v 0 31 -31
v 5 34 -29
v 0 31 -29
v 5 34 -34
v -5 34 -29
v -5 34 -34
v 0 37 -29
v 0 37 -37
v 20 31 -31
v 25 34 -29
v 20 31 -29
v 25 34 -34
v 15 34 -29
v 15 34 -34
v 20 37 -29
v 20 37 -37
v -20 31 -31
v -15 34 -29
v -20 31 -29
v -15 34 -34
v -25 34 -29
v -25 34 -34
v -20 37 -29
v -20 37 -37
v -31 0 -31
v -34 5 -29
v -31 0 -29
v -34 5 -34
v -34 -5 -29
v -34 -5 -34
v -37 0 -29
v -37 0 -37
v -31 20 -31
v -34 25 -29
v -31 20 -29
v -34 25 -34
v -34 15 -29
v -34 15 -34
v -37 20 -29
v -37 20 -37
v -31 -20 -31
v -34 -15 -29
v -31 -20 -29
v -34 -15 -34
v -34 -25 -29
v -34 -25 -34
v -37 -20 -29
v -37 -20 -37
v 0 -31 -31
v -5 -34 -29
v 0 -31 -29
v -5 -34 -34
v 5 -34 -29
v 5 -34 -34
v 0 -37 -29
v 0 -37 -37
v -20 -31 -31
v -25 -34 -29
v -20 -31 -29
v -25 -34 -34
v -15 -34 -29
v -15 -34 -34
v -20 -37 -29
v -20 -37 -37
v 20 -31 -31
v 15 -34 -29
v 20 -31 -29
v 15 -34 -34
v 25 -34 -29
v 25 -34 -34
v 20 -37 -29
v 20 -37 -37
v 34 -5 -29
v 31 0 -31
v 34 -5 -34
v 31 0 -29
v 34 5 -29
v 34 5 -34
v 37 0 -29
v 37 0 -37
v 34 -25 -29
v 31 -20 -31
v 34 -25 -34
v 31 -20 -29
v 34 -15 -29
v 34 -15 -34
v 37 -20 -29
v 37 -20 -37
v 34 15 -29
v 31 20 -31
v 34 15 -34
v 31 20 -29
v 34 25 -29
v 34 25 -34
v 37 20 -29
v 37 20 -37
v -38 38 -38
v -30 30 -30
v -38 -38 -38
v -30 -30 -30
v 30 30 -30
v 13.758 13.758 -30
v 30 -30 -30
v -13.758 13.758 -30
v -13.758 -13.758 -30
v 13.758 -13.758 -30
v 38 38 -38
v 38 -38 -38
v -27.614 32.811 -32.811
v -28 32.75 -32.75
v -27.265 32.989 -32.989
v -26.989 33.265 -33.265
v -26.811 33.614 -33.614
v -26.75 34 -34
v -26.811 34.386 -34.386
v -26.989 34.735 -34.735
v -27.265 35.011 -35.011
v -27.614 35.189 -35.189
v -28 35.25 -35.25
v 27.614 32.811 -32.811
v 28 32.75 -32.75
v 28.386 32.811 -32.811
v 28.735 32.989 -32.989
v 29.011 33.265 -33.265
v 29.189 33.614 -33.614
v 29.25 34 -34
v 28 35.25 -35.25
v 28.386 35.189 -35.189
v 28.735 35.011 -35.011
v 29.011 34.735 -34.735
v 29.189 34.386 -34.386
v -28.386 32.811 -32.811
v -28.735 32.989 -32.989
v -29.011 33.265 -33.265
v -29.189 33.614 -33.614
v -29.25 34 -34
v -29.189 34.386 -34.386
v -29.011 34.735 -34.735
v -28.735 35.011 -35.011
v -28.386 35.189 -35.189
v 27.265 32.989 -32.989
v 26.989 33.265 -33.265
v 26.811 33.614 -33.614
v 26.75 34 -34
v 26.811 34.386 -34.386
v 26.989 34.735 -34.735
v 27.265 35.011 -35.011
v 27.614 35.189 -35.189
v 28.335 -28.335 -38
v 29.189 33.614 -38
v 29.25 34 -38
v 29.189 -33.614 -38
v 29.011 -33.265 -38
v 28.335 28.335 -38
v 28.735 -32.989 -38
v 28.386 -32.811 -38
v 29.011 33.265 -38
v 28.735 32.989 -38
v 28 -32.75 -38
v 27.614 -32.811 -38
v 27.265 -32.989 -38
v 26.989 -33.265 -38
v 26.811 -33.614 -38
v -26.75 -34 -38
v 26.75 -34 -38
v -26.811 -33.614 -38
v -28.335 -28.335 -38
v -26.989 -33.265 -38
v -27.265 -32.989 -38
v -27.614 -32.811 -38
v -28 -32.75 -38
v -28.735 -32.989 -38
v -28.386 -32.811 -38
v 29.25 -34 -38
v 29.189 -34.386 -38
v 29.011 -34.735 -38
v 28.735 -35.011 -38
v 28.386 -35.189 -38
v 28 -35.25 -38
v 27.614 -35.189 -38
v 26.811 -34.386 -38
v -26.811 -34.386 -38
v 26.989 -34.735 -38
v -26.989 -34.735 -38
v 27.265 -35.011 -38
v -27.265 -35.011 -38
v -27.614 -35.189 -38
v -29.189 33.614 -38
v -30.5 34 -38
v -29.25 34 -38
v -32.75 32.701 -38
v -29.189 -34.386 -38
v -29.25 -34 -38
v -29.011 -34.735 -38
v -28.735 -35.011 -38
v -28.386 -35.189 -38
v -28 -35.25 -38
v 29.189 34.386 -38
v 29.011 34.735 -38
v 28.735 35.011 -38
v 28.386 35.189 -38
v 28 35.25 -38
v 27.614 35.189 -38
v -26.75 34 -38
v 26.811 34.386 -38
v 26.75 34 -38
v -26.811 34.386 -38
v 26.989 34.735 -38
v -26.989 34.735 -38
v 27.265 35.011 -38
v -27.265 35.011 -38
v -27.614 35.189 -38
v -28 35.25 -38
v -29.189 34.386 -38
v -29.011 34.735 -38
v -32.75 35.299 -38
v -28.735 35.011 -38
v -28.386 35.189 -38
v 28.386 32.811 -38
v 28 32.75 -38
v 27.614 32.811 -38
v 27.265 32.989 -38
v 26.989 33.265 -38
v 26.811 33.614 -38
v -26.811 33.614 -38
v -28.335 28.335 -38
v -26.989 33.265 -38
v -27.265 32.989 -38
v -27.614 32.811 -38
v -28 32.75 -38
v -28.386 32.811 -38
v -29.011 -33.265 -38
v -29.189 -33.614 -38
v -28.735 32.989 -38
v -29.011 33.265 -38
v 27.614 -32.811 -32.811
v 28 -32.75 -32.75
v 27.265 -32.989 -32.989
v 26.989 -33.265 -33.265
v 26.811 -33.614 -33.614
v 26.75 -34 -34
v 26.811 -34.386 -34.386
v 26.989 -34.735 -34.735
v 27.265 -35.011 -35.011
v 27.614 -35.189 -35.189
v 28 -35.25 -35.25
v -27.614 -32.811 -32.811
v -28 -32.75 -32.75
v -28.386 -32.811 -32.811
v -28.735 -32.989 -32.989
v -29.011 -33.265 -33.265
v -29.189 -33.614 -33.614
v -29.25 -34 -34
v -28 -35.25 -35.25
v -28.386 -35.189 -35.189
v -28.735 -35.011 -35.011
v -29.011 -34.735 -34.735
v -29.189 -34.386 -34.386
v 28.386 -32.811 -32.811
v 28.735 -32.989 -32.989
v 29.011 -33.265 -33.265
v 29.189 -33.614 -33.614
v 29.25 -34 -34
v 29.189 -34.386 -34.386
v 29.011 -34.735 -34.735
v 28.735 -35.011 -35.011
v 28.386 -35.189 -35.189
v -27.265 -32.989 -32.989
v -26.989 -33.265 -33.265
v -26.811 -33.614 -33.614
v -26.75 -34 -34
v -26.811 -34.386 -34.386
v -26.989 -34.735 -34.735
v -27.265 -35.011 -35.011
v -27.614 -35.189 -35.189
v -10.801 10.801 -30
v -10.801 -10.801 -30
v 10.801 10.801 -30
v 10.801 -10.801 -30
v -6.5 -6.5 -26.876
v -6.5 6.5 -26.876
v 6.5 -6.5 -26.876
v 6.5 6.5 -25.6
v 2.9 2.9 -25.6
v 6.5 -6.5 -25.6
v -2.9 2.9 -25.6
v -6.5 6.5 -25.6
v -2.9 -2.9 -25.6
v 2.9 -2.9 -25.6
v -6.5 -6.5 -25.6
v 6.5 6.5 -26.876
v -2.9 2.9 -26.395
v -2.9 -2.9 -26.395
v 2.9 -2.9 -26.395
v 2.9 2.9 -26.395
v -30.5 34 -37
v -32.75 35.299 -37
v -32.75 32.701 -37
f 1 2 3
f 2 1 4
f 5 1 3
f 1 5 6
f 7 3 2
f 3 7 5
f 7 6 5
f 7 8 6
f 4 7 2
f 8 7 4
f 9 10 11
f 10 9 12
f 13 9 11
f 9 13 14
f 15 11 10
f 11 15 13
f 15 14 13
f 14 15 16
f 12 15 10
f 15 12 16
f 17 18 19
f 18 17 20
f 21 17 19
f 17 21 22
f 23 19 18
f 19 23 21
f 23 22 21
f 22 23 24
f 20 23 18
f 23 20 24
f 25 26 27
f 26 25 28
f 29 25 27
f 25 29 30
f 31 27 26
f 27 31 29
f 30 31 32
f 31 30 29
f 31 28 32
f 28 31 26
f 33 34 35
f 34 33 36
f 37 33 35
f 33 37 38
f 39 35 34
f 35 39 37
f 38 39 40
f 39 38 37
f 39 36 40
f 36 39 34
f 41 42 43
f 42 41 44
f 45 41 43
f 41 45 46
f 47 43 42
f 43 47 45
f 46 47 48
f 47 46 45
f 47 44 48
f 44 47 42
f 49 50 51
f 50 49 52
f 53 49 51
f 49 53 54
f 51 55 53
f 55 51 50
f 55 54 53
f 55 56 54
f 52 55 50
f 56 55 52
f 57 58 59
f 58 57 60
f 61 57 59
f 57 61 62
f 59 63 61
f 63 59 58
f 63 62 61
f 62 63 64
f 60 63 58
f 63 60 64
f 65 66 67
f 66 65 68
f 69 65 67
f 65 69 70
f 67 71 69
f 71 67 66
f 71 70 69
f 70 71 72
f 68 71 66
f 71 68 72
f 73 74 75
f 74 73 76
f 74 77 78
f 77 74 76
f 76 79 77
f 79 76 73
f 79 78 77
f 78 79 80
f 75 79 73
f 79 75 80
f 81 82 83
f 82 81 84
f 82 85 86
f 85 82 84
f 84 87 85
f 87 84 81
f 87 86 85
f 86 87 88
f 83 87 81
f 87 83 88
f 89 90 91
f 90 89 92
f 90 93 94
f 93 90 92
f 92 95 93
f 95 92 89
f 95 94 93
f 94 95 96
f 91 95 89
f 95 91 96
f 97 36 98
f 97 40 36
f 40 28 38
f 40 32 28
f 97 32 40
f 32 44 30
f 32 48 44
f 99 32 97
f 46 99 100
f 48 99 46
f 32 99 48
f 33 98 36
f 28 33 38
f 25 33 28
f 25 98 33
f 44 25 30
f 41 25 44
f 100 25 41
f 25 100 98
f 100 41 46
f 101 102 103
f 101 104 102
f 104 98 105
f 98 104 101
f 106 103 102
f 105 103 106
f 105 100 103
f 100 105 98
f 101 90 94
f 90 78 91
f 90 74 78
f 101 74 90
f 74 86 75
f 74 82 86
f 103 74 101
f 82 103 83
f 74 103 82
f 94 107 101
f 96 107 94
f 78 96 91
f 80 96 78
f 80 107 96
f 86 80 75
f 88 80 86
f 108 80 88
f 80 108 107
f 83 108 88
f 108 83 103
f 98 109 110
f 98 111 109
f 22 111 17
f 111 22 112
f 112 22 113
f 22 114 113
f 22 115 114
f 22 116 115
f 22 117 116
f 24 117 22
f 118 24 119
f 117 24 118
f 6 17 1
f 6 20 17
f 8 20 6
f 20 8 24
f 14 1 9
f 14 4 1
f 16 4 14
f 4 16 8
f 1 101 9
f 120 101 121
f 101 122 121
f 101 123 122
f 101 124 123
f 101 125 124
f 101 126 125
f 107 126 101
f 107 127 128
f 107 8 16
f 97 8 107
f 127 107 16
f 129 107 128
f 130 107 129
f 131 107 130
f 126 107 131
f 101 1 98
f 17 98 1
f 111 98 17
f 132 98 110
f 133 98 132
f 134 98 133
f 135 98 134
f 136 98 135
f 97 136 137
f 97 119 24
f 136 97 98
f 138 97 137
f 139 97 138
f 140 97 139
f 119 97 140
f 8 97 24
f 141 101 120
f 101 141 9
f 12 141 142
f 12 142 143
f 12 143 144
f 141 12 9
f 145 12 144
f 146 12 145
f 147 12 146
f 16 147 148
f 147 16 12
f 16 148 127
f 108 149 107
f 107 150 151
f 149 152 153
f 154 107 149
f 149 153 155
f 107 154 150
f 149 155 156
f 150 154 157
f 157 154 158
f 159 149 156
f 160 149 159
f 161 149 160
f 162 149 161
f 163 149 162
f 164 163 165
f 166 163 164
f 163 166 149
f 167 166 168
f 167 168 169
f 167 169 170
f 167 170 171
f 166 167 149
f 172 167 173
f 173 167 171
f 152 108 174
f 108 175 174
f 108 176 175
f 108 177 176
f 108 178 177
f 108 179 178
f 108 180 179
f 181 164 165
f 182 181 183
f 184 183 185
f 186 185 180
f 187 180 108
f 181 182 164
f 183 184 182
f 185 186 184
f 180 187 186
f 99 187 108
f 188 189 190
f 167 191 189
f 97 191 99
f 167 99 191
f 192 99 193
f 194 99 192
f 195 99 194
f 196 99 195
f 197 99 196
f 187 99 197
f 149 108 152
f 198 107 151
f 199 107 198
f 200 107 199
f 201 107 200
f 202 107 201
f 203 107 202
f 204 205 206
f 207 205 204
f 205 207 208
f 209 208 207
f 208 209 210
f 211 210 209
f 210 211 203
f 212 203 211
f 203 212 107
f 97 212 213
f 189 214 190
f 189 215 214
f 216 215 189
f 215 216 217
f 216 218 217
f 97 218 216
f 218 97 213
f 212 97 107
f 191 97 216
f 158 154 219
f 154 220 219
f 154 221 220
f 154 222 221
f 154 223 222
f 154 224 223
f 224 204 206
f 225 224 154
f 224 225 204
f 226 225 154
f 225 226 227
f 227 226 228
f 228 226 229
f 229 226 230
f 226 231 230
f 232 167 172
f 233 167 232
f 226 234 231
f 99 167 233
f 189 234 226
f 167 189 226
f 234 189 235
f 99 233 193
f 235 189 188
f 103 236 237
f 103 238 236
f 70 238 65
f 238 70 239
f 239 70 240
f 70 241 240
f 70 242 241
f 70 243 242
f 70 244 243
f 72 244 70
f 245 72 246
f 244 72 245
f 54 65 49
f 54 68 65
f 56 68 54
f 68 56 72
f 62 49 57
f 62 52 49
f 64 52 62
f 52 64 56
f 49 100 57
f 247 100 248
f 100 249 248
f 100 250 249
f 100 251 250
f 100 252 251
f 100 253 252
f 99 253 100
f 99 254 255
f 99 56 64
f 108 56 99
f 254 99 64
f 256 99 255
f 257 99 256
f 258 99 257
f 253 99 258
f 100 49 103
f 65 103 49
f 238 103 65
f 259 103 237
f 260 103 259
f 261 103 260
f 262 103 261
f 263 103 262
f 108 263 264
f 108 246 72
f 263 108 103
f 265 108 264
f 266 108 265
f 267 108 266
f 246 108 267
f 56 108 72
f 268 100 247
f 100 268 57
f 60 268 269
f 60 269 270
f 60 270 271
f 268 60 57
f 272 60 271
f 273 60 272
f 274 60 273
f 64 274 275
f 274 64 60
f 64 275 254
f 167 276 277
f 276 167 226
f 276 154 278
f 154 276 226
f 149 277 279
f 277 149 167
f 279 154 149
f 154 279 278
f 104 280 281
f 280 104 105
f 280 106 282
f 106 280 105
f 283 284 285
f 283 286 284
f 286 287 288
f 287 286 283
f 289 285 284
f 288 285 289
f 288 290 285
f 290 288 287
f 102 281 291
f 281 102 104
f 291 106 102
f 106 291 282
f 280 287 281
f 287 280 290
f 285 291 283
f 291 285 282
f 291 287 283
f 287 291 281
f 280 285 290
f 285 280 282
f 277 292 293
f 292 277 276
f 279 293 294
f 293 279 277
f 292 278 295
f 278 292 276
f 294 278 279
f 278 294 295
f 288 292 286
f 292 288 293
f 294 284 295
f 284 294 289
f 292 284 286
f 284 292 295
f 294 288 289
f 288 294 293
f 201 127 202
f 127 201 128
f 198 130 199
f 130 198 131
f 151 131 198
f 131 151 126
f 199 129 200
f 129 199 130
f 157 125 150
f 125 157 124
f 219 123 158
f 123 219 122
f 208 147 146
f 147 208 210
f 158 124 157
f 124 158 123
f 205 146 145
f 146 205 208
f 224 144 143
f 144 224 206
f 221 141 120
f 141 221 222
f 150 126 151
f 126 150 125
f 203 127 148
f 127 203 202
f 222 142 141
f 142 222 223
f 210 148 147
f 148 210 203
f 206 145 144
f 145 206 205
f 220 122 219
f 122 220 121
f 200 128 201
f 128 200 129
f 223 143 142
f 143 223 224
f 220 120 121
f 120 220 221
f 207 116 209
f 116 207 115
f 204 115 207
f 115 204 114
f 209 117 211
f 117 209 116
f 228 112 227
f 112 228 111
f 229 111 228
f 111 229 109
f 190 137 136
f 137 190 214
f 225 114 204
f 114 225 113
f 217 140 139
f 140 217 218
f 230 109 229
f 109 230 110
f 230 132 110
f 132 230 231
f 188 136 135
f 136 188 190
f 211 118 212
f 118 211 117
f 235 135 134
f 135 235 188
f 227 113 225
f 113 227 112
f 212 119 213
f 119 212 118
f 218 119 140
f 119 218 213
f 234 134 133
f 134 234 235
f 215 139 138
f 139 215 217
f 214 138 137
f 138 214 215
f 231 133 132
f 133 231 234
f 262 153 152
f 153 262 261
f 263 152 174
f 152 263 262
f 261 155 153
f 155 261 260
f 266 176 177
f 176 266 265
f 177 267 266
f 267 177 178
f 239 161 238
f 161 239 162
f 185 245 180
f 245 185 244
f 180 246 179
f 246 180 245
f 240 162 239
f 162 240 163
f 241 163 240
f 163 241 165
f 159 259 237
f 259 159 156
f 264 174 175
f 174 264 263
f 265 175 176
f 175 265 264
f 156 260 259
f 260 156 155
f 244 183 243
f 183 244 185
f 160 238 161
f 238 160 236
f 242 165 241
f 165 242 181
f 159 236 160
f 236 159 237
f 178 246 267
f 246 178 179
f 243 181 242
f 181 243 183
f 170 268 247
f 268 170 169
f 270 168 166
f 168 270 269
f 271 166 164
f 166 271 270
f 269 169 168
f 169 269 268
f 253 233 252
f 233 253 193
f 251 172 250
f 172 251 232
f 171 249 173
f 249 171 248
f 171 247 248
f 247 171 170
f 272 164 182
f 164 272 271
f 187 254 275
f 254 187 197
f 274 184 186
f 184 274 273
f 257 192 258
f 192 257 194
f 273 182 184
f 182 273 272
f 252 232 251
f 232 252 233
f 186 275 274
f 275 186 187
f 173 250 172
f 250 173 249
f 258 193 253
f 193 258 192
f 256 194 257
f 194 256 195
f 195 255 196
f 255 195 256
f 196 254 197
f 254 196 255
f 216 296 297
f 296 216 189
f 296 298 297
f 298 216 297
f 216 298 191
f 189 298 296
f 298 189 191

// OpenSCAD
// file: lib/mx.scad
module m2_nut(height = 1.54) {
    cylinder(r = 2.6, h = height, center = true, $fn = 6);
}

module m2_hole(height = 10) {
    cylinder(r = 1.2, h = height, center = true);
}

module m3_nut(height = 2.34) {
    cylinder(r = 3.4, h = height, center = true, $fn = 6);
}

module m3_hole(height = 10) {
    cylinder(r = 1.9, h = height, center = true);
}

module m4_nut(height = 2.88) {
    cylinder(r = 4.3, h = height, center = true, $fn = 6);
}

module m4_hole(height = 10) {
    cylinder(r = 2.2, h = height, center = true);
}
// file: lib/Spiff.scad
include <spiffsans.scad>

module write(string,font=spiffsans,spacing=1,i=0) {
  if (i < len(string)) {
    assign(charindex = search(string[i],font,1)[0])
    
    // If the character is in the font
    if (charindex != undef) {
      assign(glyph = font[charindex][2])
      if (glyph){
        polygon(points=glyph[0], paths=glyph[1]);
      }
      translate([font[charindex][1] + spacing, 0, 0])
        write(string, font, spacing, i=i+1);
    } else {
      assign(glyph = font[0][2])
      if (glyph){
        polygon(points=glyph[0], paths=glyph[1]);
      }
      translate([font[0][1] + spacing,0,0])
        write(string, font, spacing, i=i+1);
    }
  }
}
// main file
use <lib/Spiff.scad>;
use <lib/mx.scad>;

$fn = 20;

SIZE = 76;
RIDGE_WIDTH = 8;

THICKNESS = 3;

HOLE_DIAMETER = 2 + .5;

ELEC_WIDTH = 42.3;
ELEC_LENGTH = 40;
ELEC_THICKNESS = 0.8;

ELEC_SUPPORT_WIDTH = 37;
ELEC_SUPPORT_LENGTH = 35;
ELEC_HOLE_DIAMETER = 3;

GY27_WIDTH = 15.55;
GY27_LENGTH = 32.55;
GY27_THICKNESS = 1.6;
GY27_HEIGHT = 3.8;
GY27_HOLE_DIAMETER = 3;

REFLECTOR_HEIGHT = 12;

DEBUG = false;

module coil() {
    ediameter = 39;
    idiameter = 29.1;
    difference() {
        cylinder(r = ediameter / 2, h = 1.7);

        translate([0, 0, -2]) {
            cylinder(r = idiameter / 2, h = 10);
        }
    }

    translate([(ediameter - (ediameter - idiameter) / 2) / 2, 0, 0]) {
        cylinder(r = 2, h = 12);
    }
}

module charger() {
    cube(size = [9.9, 24.5, 4], center = true);
}

module gy27(support = false) {
    positions = [
        [GY27_WIDTH / 2 - 2, GY27_LENGTH / 2 - 3, 0],
        [-GY27_WIDTH / 2 + 2, GY27_LENGTH / 2 - 3, 0],
    ];

    if (support) {
        for (pos = positions) {
            translate([pos[0], pos[1], pos[2] - 0.25]) {
                cylinder(r = GY27_HOLE_DIAMETER / 2 + 0.7, h = 0.5, center = true);
                translate([0, 0, 2]) {
                    cylinder(r = GY27_HOLE_DIAMETER / 2 - 0.2, h = 5, center = true);
                }
            }
        }
    } else {
        difference() {
            cube(size = [GY27_WIDTH, GY27_LENGTH, GY27_THICKNESS], center = true);
            for (pos = positions) {
                translate(pos) {
                    cylinder(r = GY27_HOLE_DIAMETER / 2, h = 10, center = true);

                    if ($children) {
                        for (i = [0 : $children - 1]) {
                            child(0);
                        }
                    }
                }
            }
        }
    }
}

module electronic(version = 1, diff = false) {
    module bluetooth() {
        width = 10;
        length = 15;
        translate([-ELEC_WIDTH / 2, -ELEC_LENGTH / 2 + 16 / 2 - 0.5, 0]) {
            cube(size = [width, length, ELEC_THICKNESS], center = true);
        }
    }

    module holes() {
        for(pos = [
            [ELEC_SUPPORT_WIDTH / 2, ELEC_SUPPORT_LENGTH / 2, -5, 2],
            [-ELEC_SUPPORT_WIDTH / 2, ELEC_SUPPORT_LENGTH / 2, -5, 2],
            [ELEC_SUPPORT_WIDTH / 2, -ELEC_SUPPORT_LENGTH / 2, -5, 2],
            [-ELEC_SUPPORT_WIDTH / 2, -ELEC_SUPPORT_LENGTH / 2, -5, 1],
        ]) {
            if (pos[3] >= version) {
                translate([pos[0], pos[1], -10]) {
                    cylinder(r = ELEC_HOLE_DIAMETER / 2, h = 10);
                }

                if ($children) {
                    translate([pos[0], pos[1], 0]) {
                        child(0);
                    }
                }
            }
        }
    }

    module body() {
        cube(size = [ELEC_WIDTH, ELEC_LENGTH, ELEC_THICKNESS], center = true);
        if (version == 2) {
            bluetooth();
        }
    }

    if (diff) {
        //body();
        holes() {
            if ($children) {
                child(0);
            }
        };
    } else {
        difference() {
            body();
            holes();
        }
    }
}

LIPO_WIDTH = 40;
LIPO_LENGTH = 65;
LIPO_THICKNESS = 7;

module lipo() {
    cube(size = [LIPO_LENGTH, LIPO_WIDTH, LIPO_THICKNESS], center = true);
}

SPEAKER_DIAMETER = 28.5;
module speaker() {
    thickness = 5;
    clear = 0.5;

    module holes() {
        for (pos = [
            [31.7 / 2, 0, 0],
            [-31.7 / 2, 0, 0],
        ]) {
            translate(pos) {
                child(0);
            }
        }
    }

    hull() {
        cylinder(r = SPEAKER_DIAMETER / 2, h = thickness, center = true);
        holes() {
            cylinder(r = 3.5, h = thickness, center = true);
        }
    }

    holes() {
        child(0);
    }
}

module vibrator() {
    translate([29, -25, 0]) {
        cylinder(r = 1.5, h = 10, center = true);
        translate([0, 12, 0]) {
            cylinder(r = 1.5, h = 10, center = true);
        }

        hull() {
            translate([0, 0, -2]) {
                cylinder(r = 3.5, h = 5, center = true);
            }

            translate([0, 12, -2]) {
                cylinder(r = 3.5, h = 5, center = true);
            }
        }
    }
}

module struct() {

    thickness = 4;
    height = SIZE - RIDGE_WIDTH * 2;
    size = sqrt(pow(height, 2) + pow(height, 2));
    ear = 20;

    lipo_support_thickness = 3;

    module lipo_support() {
        translate([0, -LIPO_WIDTH / 2 - lipo_support_thickness / 2 + 2, - thickness / 2 - LIPO_THICKNESS / 2]) {
            cube(size = [LIPO_LENGTH + thickness, lipo_support_thickness + thickness, LIPO_THICKNESS + thickness], center = true);
        }
    }

    module _speaker() {
        translate([25, 5, 6]) {
            cylinder(r = SPEAKER_DIAMETER / 2, h = 50, center = true);
            rotate([0, 0, 45]) {
                color("ORANGE") speaker() {
                    child(0);
                }
            }

            /*
            translate([8, SPEAKER_DIAMETER / 2 + 5, 0]) {
                cylinder(r = 3, h = 50, center = true);
            }
            */
        }

        translate([37, -SPEAKER_DIAMETER / 2 + 10, 0]) {
            cylinder(r = 3, h = 50, center = true);
        }
    }

/*
    module _gy27(support = false) {
        rotate([90, 45, 0]) {
            translate([21, -12, height / 2]) {
                gy27(support);
            }
        }
    }
*/
    rotate([90, 0, 45]) {
        difference() {

            union() {
                // Helper
                //%cube(size = [size, height, 1], center = true);

                cube(size = [size, height - REFLECTOR_HEIGHT - 2, thickness], center = true);
                for (pos = [
                    [size / 2 - ear / 2, height / 2 - ear / 2, 0],
                    [-size / 2 + ear / 2, height / 2 - ear / 2, 0],
                    [size / 2 - ear / 2, -height / 2 + ear / 2, 0],
                    [-size / 2 + ear / 2, -height / 2 + ear / 2, 0]
                ]) {
                    translate(pos) {
                        cube(size = [ear, ear, thickness], center = true);
                    }
                }

                if (DEBUG) {
                    translate([-12, 0, thickness]) {
                        color("RED") electronic(2);
                    }
                }

                if (DEBUG) {
                    translate([0, 0, - thickness / 2 - LIPO_THICKNESS / 2]) {
                        //%color("GREY") lipo();
                    }
                }

                lipo_support();

                //_speaker();
            }

            for (pos = [
                [0, SIZE / 2 - RIDGE_WIDTH / 2, 0, 45, 90],
                [0, - SIZE / 2 + RIDGE_WIDTH / 2, 0, -45, 90],
                [0, SIZE / 2 - RIDGE_WIDTH / 2, 0, -45, 90],
                [0, - SIZE / 2 + RIDGE_WIDTH / 2, 0, 45, 90]
            ]) {
                rotate([pos[3], 0, pos[4]]) {
                    translate([pos[0], pos[1], pos[2]]) {
                        cube(size = [SIZE, RIDGE_WIDTH, SIZE], center = true);
                    }
                }
            }

            translate([-12, 0, thickness]) {
                electronic(2, true) {
                    union() {
                        translate([0, 0, -4.9]) {
                            m3_nut();
                        }
                    }
                }
            }

            translate([0, 0, - thickness / 2 - LIPO_THICKNESS / 2 - .005]) {
                lipo();
            }

            translate([0, 0, -3]) {
                _speaker() {
                    union() {
                        cylinder(r = 1.5, h = 50, center = true);
                        translate([0, 0, -4.9]) {
                            m3_nut();
                            //cylinder(r = 3.5, h = 5, center = true);
                        }
                    }
                }
            }

            vibrator();
        }
    }
}

module front(index, connection) {
    edge_size = SIZE / 2 * sqrt(2);

    module _charger() {
        rotate([0, 0, -45]) {
            translate([22, 0, 7.8]) {
                scale([1.1, 1.1, 1]) {
                    charger();
                }
            }
        }
    }

    module plot(add, substract = true) {
        width = 4;
        length = 10;
        height = 8;

        clear = 0.4;
        clear_height = 8;

        module _plot(clear = 1, clear_height = 1) {
            //cube(size = [length + clear, width + clear, height + clear_height], center = true);
            //cube(size = [length - 5 + clear, width + 2 + clear, height + clear_height], center = true);

            scale([clear, clear, clear_height]) {
                translate([0, -4, 0.5]) {
                    linear_extrude(height = height, center = true) {
                        //polygon([[-5,0],[-3,0],[-3,-1],[3,-1],[3,0],[5,0],[5,3],[0,5],[-5,3]]);
                        polygon([[0,1],[5,4],[0,7],[-5,4]]);
                    }
                }
            }
        }

        for (data = [
            [0, SIZE / 2 - RIDGE_WIDTH / 2, 4.5],
            [20, SIZE / 2 - RIDGE_WIDTH / 2, 4.5],
            [-20, SIZE / 2 - RIDGE_WIDTH / 2, 4.5],
        ]) {
            translate(data) {
                if (add && !substract) {
                    _plot();
                } else if (substract) {
                    rotate([90, 0, 0]) {
                        //_plot(clear, clear_height);
                        _plot(1.1, 1.3);
                    }
                }
            }
        }
    }

    module blocker(connection, substract = false) {
        data = [0, 90, 180, 270];
        for (i = [0 : 3]) {
            rotate([0, 0, 45 + data[i]]) {
                if (substract && !connection[i]) {
                    plot(connection[i], substract);
                } else if (!substract && connection[i]) {
                    plot(connection[i], substract);
                }
            }
        }
    }

    module reflector(fill = false) {
        edge_thickness = 0.2;
        hole_width = 5.8;
        size = ((SIZE - RIDGE_WIDTH * 2) / 2) * sqrt(2) + 2;

        if (fill) {
            translate([0, 0, 1.3]) {
                rotate([0, 0, 45]) {
                    cylinder(r1 = hole_width / sqrt(2), r2 = size, h = REFLECTOR_HEIGHT + 1.01, $fn = 4, center = true);
                }
            }
        } else {
            difference() {
                union() {
                    rotate([0, 0, 45]) {
                        cylinder(r1 = 5, r2 = size, h = REFLECTOR_HEIGHT, $fn = 4, center = true);
                    }

                    translate([0, 0, -REFLECTOR_HEIGHT + 8.5]) {
                        cube(size = [13, 13, 5], center = true);
                    }
                }

                translate([0, 0, 1.3]) {
                    rotate([0, 0, 45]) {
                        cylinder(r1 = hole_width / sqrt(2), r2 = size, h = REFLECTOR_HEIGHT + 1.01, $fn = 4, center = true);
                    }
                }

                translate([0, 0, 1]) {
                    cube(size = [hole_width, hole_width, 50], center = true);
                }
            }
        }
    }

    module holes_top() {
        rotate([0, 0, 45]) {
            for(pos = [
                [SIZE / 2 - RIDGE_WIDTH - 2, SIZE / 2 - RIDGE_WIDTH / 2, 0],
                [-SIZE / 2 + RIDGE_WIDTH + 2, SIZE / 2 - RIDGE_WIDTH / 2, 0],
                [SIZE / 2 - RIDGE_WIDTH - 2, -SIZE / 2 + RIDGE_WIDTH / 2, 0],
                [-SIZE / 2 + RIDGE_WIDTH + 2, -SIZE / 2 + RIDGE_WIDTH / 2, 0],
            ]) {
                translate(pos) {
                    cylinder(r = HOLE_DIAMETER / 2, h = 50, center = true);
                }
            }
        }
    }

    module holes_test() {
        holes_clear = 0.1;
        rotate([90, 0, 45]) {
            for(pos = [
                [SIZE / 2 - RIDGE_WIDTH - 2, RIDGE_WIDTH / 2, 0],
                [-SIZE / 2 + RIDGE_WIDTH + 2, RIDGE_WIDTH / 2, 0],
            ]) {
                translate(pos) {
                    cylinder(r = HOLE_DIAMETER / 2 - holes_clear, h = 150, center = true);
                }
            }
        }
    }

    module mark(index) {
        diameter = 3;
        for (i = [1 : index]) {
            rotate([0, 0, 45]) {
                translate([- SIZE / 2 + i * diameter * 2, SIZE / 2 - RIDGE_WIDTH / 2, 0]) {
                    cylinder(r = diameter / 2, h = 2, center = true, $fn = 3);
//                translate([- SIZE / 2 + i * diameter * 2, SIZE / 2 - RIDGE_WIDTH / 2 + 3, 0]) {
                    //cube(size = [3, 2, 1]);
                }
            }
        }
    }

    if (connection[0] || connection[1] || connection[2] || connection[3]) {
        blocker(connection, false);
    }

    difference() {
        union() {
            difference() {
                cylinder(r1 = edge_size, r2 = edge_size - RIDGE_WIDTH / 2 * sqrt(2) * 2, h = RIDGE_WIDTH, $fn = 4);

                translate([0, 0, 6.4]) {
                    rotate([0, 180, 45]) {
                        reflector(true);
                    }
                }
            }

            translate([0, 0, 6.4]) {
                rotate([0, 180, 45]) {
                    reflector();
                }
            }
        }

        blocker(connection, true);

        if (index == 0) {
            coil();

            _charger();
        }

        // Top holes
        if (index == 1) {
            holes_top();
        }

        if (index == 2) {
            holes_test();
        }

        if (index == 3) {
            holes_test();
        }

        if (index) {
            mark(index);
        }
    }

    if (index == 0) {
        translate([7, 23.5, 8.5]) {
            rotate([0, 0, -135]) {
                if (DEBUG) {
                    translate([0, 0, 0.8]) {
                        color("BLUE") gy27();
                    }
                }

                gy27(true);
            }
        }

        if (DEBUG) {
            color("blue") {
                coil();

                _charger();
            }
        }
    }
}

module face(type = 0, text = "", text_rot = [0, 0, 0], text_pos = [0, 0, 0]) {
    nut_head_diameter = 4.6; // Before : 4: serré, 5: too large
    nut_head_height = 1.3;
    thickness = 2;
    text_deep = 1;
    difference() {
        translate([0, 0, SIZE / 2 + thickness / 2]) {
            // Biggest type
            if (type == 0) {
                cube(size = [SIZE + thickness * 2, SIZE + thickness * 2, 2], center = true);
            // Medium type
            } else if (type == 1) {
                cube(size = [SIZE, SIZE + thickness * 2, 2], center = true);
            // Smallest type
            } else if (type == 2) {
                cube(size = [SIZE, SIZE, 2], center = true);
            }
        }

/*
        translate([0, 0, SIZE / 2 - nut_head_height + thickness]) {
            holes() {
                cylinder(r = nut_head_diameter / 2, h = 2);
            }
        }
*/
        translate([-10, -15, SIZE / 2 + thickness - text_deep]) {
            scale([3.5, 3.5, 1]) {
                rotate(text_rot) {
                    translate(text_pos) {
                        linear_extrude(height = 20) {
                            write(text);
                        }
                    }
                }
            }
        }
    }
}

module faces(which = -1, offset = 30) {
    for (data = [
        [[0, 0, offset],    [0, 0, 0],      0, "1", [0, 0, 90], [1.5, -7.5, 0]],
        [[0, 0, -offset],   [180, 0, 0],    0, "0"],
        [[offset, 0, 0],    [0, 90, 0],     1, "5", [0, 0, 90], [1.5, -7.5, 0]],
        [[-offset, 0, 0],   [0, -90, 0],    1, "4", [0, 0, -90], [-7, -2, 0]],
        [[0, -offset, 0],   [90, 0, 0],     2, "3"],
        [[0, offset, 0],    [-90, 0, 0],    2, "2", [0, 0, 180], [-6, -9, 0]]
    ]) {
        if (which == -1 || which == data[3]) {
            translate(data[0]) {
                rotate(data[1]) {
                    %face(data[2], data[3], data[4], data[5]);
                }
            }
        }
    }
}

module main(side = -1, offset = 10) {

    for (data = [
        [0, [0, 0, -SIZE / 2 - offset], [0, 0, 45], [true, true, true, true]], // Bottom
        [1, [0, 0, SIZE / 2 + offset], [180, 0, 45], [true, true, true, true]],    // Top
        [2, [0, SIZE / 2 + offset, 0], [90, 45, 0], [false, true, false, true]],
        [3, [0, -SIZE / 2 - offset, 0], [-90, 135, 0], [false, true, false, true]],
        [4, [-SIZE / 2 - offset, 0, 0], [90, 45, 90], [false, false, false, false]],
        [5, [SIZE / 2 + offset, 0, 0], [90, 45, -90], [false, false, false, false]],
    ]) {
        if (side < 0 || side == data[0]) {
            translate(data[1]) {
                rotate(data[2]) {
                    front(data[0], data[3]);
                }
            }
        }
    }
}

module getside(side) {
    data = [
        [0, 0, 0],
        [180, 0, 0],
        [-90, 0, 0],
        [90, 0, 0],
        [0, -90, 0],
        [0, 90, 0]
    ];

    rotate(data[side]) {
        main(side, offset = 0);
    }
}

module getsides(sides, offset = 10) {
    for (side = sides) {
        main(side, offset);
    }
}

if (0) {

    //main();
    main(-1, 0);

    faces(-1, 5);

} else {

    if (1) {
        getside(1);
    } else {
        getsides([0, 2, 4], 0);
        struct();
    }

/*
    intersection() {
        translate([0, SIZE / 2, -SIZE / 2]) {
            cube(size = [100, 30, 20], center = true);
        }

        rotate([0, 0, 180]) {
            getside(3);
        }
    }

    translate([0, -50, 0]) {
        intersection() {
            translate([0, SIZE / 2, -SIZE / 2]) {
                cube(size = [100, 30, 20], center = true);
            }
            getside(1);
        }
    }
*/
}
